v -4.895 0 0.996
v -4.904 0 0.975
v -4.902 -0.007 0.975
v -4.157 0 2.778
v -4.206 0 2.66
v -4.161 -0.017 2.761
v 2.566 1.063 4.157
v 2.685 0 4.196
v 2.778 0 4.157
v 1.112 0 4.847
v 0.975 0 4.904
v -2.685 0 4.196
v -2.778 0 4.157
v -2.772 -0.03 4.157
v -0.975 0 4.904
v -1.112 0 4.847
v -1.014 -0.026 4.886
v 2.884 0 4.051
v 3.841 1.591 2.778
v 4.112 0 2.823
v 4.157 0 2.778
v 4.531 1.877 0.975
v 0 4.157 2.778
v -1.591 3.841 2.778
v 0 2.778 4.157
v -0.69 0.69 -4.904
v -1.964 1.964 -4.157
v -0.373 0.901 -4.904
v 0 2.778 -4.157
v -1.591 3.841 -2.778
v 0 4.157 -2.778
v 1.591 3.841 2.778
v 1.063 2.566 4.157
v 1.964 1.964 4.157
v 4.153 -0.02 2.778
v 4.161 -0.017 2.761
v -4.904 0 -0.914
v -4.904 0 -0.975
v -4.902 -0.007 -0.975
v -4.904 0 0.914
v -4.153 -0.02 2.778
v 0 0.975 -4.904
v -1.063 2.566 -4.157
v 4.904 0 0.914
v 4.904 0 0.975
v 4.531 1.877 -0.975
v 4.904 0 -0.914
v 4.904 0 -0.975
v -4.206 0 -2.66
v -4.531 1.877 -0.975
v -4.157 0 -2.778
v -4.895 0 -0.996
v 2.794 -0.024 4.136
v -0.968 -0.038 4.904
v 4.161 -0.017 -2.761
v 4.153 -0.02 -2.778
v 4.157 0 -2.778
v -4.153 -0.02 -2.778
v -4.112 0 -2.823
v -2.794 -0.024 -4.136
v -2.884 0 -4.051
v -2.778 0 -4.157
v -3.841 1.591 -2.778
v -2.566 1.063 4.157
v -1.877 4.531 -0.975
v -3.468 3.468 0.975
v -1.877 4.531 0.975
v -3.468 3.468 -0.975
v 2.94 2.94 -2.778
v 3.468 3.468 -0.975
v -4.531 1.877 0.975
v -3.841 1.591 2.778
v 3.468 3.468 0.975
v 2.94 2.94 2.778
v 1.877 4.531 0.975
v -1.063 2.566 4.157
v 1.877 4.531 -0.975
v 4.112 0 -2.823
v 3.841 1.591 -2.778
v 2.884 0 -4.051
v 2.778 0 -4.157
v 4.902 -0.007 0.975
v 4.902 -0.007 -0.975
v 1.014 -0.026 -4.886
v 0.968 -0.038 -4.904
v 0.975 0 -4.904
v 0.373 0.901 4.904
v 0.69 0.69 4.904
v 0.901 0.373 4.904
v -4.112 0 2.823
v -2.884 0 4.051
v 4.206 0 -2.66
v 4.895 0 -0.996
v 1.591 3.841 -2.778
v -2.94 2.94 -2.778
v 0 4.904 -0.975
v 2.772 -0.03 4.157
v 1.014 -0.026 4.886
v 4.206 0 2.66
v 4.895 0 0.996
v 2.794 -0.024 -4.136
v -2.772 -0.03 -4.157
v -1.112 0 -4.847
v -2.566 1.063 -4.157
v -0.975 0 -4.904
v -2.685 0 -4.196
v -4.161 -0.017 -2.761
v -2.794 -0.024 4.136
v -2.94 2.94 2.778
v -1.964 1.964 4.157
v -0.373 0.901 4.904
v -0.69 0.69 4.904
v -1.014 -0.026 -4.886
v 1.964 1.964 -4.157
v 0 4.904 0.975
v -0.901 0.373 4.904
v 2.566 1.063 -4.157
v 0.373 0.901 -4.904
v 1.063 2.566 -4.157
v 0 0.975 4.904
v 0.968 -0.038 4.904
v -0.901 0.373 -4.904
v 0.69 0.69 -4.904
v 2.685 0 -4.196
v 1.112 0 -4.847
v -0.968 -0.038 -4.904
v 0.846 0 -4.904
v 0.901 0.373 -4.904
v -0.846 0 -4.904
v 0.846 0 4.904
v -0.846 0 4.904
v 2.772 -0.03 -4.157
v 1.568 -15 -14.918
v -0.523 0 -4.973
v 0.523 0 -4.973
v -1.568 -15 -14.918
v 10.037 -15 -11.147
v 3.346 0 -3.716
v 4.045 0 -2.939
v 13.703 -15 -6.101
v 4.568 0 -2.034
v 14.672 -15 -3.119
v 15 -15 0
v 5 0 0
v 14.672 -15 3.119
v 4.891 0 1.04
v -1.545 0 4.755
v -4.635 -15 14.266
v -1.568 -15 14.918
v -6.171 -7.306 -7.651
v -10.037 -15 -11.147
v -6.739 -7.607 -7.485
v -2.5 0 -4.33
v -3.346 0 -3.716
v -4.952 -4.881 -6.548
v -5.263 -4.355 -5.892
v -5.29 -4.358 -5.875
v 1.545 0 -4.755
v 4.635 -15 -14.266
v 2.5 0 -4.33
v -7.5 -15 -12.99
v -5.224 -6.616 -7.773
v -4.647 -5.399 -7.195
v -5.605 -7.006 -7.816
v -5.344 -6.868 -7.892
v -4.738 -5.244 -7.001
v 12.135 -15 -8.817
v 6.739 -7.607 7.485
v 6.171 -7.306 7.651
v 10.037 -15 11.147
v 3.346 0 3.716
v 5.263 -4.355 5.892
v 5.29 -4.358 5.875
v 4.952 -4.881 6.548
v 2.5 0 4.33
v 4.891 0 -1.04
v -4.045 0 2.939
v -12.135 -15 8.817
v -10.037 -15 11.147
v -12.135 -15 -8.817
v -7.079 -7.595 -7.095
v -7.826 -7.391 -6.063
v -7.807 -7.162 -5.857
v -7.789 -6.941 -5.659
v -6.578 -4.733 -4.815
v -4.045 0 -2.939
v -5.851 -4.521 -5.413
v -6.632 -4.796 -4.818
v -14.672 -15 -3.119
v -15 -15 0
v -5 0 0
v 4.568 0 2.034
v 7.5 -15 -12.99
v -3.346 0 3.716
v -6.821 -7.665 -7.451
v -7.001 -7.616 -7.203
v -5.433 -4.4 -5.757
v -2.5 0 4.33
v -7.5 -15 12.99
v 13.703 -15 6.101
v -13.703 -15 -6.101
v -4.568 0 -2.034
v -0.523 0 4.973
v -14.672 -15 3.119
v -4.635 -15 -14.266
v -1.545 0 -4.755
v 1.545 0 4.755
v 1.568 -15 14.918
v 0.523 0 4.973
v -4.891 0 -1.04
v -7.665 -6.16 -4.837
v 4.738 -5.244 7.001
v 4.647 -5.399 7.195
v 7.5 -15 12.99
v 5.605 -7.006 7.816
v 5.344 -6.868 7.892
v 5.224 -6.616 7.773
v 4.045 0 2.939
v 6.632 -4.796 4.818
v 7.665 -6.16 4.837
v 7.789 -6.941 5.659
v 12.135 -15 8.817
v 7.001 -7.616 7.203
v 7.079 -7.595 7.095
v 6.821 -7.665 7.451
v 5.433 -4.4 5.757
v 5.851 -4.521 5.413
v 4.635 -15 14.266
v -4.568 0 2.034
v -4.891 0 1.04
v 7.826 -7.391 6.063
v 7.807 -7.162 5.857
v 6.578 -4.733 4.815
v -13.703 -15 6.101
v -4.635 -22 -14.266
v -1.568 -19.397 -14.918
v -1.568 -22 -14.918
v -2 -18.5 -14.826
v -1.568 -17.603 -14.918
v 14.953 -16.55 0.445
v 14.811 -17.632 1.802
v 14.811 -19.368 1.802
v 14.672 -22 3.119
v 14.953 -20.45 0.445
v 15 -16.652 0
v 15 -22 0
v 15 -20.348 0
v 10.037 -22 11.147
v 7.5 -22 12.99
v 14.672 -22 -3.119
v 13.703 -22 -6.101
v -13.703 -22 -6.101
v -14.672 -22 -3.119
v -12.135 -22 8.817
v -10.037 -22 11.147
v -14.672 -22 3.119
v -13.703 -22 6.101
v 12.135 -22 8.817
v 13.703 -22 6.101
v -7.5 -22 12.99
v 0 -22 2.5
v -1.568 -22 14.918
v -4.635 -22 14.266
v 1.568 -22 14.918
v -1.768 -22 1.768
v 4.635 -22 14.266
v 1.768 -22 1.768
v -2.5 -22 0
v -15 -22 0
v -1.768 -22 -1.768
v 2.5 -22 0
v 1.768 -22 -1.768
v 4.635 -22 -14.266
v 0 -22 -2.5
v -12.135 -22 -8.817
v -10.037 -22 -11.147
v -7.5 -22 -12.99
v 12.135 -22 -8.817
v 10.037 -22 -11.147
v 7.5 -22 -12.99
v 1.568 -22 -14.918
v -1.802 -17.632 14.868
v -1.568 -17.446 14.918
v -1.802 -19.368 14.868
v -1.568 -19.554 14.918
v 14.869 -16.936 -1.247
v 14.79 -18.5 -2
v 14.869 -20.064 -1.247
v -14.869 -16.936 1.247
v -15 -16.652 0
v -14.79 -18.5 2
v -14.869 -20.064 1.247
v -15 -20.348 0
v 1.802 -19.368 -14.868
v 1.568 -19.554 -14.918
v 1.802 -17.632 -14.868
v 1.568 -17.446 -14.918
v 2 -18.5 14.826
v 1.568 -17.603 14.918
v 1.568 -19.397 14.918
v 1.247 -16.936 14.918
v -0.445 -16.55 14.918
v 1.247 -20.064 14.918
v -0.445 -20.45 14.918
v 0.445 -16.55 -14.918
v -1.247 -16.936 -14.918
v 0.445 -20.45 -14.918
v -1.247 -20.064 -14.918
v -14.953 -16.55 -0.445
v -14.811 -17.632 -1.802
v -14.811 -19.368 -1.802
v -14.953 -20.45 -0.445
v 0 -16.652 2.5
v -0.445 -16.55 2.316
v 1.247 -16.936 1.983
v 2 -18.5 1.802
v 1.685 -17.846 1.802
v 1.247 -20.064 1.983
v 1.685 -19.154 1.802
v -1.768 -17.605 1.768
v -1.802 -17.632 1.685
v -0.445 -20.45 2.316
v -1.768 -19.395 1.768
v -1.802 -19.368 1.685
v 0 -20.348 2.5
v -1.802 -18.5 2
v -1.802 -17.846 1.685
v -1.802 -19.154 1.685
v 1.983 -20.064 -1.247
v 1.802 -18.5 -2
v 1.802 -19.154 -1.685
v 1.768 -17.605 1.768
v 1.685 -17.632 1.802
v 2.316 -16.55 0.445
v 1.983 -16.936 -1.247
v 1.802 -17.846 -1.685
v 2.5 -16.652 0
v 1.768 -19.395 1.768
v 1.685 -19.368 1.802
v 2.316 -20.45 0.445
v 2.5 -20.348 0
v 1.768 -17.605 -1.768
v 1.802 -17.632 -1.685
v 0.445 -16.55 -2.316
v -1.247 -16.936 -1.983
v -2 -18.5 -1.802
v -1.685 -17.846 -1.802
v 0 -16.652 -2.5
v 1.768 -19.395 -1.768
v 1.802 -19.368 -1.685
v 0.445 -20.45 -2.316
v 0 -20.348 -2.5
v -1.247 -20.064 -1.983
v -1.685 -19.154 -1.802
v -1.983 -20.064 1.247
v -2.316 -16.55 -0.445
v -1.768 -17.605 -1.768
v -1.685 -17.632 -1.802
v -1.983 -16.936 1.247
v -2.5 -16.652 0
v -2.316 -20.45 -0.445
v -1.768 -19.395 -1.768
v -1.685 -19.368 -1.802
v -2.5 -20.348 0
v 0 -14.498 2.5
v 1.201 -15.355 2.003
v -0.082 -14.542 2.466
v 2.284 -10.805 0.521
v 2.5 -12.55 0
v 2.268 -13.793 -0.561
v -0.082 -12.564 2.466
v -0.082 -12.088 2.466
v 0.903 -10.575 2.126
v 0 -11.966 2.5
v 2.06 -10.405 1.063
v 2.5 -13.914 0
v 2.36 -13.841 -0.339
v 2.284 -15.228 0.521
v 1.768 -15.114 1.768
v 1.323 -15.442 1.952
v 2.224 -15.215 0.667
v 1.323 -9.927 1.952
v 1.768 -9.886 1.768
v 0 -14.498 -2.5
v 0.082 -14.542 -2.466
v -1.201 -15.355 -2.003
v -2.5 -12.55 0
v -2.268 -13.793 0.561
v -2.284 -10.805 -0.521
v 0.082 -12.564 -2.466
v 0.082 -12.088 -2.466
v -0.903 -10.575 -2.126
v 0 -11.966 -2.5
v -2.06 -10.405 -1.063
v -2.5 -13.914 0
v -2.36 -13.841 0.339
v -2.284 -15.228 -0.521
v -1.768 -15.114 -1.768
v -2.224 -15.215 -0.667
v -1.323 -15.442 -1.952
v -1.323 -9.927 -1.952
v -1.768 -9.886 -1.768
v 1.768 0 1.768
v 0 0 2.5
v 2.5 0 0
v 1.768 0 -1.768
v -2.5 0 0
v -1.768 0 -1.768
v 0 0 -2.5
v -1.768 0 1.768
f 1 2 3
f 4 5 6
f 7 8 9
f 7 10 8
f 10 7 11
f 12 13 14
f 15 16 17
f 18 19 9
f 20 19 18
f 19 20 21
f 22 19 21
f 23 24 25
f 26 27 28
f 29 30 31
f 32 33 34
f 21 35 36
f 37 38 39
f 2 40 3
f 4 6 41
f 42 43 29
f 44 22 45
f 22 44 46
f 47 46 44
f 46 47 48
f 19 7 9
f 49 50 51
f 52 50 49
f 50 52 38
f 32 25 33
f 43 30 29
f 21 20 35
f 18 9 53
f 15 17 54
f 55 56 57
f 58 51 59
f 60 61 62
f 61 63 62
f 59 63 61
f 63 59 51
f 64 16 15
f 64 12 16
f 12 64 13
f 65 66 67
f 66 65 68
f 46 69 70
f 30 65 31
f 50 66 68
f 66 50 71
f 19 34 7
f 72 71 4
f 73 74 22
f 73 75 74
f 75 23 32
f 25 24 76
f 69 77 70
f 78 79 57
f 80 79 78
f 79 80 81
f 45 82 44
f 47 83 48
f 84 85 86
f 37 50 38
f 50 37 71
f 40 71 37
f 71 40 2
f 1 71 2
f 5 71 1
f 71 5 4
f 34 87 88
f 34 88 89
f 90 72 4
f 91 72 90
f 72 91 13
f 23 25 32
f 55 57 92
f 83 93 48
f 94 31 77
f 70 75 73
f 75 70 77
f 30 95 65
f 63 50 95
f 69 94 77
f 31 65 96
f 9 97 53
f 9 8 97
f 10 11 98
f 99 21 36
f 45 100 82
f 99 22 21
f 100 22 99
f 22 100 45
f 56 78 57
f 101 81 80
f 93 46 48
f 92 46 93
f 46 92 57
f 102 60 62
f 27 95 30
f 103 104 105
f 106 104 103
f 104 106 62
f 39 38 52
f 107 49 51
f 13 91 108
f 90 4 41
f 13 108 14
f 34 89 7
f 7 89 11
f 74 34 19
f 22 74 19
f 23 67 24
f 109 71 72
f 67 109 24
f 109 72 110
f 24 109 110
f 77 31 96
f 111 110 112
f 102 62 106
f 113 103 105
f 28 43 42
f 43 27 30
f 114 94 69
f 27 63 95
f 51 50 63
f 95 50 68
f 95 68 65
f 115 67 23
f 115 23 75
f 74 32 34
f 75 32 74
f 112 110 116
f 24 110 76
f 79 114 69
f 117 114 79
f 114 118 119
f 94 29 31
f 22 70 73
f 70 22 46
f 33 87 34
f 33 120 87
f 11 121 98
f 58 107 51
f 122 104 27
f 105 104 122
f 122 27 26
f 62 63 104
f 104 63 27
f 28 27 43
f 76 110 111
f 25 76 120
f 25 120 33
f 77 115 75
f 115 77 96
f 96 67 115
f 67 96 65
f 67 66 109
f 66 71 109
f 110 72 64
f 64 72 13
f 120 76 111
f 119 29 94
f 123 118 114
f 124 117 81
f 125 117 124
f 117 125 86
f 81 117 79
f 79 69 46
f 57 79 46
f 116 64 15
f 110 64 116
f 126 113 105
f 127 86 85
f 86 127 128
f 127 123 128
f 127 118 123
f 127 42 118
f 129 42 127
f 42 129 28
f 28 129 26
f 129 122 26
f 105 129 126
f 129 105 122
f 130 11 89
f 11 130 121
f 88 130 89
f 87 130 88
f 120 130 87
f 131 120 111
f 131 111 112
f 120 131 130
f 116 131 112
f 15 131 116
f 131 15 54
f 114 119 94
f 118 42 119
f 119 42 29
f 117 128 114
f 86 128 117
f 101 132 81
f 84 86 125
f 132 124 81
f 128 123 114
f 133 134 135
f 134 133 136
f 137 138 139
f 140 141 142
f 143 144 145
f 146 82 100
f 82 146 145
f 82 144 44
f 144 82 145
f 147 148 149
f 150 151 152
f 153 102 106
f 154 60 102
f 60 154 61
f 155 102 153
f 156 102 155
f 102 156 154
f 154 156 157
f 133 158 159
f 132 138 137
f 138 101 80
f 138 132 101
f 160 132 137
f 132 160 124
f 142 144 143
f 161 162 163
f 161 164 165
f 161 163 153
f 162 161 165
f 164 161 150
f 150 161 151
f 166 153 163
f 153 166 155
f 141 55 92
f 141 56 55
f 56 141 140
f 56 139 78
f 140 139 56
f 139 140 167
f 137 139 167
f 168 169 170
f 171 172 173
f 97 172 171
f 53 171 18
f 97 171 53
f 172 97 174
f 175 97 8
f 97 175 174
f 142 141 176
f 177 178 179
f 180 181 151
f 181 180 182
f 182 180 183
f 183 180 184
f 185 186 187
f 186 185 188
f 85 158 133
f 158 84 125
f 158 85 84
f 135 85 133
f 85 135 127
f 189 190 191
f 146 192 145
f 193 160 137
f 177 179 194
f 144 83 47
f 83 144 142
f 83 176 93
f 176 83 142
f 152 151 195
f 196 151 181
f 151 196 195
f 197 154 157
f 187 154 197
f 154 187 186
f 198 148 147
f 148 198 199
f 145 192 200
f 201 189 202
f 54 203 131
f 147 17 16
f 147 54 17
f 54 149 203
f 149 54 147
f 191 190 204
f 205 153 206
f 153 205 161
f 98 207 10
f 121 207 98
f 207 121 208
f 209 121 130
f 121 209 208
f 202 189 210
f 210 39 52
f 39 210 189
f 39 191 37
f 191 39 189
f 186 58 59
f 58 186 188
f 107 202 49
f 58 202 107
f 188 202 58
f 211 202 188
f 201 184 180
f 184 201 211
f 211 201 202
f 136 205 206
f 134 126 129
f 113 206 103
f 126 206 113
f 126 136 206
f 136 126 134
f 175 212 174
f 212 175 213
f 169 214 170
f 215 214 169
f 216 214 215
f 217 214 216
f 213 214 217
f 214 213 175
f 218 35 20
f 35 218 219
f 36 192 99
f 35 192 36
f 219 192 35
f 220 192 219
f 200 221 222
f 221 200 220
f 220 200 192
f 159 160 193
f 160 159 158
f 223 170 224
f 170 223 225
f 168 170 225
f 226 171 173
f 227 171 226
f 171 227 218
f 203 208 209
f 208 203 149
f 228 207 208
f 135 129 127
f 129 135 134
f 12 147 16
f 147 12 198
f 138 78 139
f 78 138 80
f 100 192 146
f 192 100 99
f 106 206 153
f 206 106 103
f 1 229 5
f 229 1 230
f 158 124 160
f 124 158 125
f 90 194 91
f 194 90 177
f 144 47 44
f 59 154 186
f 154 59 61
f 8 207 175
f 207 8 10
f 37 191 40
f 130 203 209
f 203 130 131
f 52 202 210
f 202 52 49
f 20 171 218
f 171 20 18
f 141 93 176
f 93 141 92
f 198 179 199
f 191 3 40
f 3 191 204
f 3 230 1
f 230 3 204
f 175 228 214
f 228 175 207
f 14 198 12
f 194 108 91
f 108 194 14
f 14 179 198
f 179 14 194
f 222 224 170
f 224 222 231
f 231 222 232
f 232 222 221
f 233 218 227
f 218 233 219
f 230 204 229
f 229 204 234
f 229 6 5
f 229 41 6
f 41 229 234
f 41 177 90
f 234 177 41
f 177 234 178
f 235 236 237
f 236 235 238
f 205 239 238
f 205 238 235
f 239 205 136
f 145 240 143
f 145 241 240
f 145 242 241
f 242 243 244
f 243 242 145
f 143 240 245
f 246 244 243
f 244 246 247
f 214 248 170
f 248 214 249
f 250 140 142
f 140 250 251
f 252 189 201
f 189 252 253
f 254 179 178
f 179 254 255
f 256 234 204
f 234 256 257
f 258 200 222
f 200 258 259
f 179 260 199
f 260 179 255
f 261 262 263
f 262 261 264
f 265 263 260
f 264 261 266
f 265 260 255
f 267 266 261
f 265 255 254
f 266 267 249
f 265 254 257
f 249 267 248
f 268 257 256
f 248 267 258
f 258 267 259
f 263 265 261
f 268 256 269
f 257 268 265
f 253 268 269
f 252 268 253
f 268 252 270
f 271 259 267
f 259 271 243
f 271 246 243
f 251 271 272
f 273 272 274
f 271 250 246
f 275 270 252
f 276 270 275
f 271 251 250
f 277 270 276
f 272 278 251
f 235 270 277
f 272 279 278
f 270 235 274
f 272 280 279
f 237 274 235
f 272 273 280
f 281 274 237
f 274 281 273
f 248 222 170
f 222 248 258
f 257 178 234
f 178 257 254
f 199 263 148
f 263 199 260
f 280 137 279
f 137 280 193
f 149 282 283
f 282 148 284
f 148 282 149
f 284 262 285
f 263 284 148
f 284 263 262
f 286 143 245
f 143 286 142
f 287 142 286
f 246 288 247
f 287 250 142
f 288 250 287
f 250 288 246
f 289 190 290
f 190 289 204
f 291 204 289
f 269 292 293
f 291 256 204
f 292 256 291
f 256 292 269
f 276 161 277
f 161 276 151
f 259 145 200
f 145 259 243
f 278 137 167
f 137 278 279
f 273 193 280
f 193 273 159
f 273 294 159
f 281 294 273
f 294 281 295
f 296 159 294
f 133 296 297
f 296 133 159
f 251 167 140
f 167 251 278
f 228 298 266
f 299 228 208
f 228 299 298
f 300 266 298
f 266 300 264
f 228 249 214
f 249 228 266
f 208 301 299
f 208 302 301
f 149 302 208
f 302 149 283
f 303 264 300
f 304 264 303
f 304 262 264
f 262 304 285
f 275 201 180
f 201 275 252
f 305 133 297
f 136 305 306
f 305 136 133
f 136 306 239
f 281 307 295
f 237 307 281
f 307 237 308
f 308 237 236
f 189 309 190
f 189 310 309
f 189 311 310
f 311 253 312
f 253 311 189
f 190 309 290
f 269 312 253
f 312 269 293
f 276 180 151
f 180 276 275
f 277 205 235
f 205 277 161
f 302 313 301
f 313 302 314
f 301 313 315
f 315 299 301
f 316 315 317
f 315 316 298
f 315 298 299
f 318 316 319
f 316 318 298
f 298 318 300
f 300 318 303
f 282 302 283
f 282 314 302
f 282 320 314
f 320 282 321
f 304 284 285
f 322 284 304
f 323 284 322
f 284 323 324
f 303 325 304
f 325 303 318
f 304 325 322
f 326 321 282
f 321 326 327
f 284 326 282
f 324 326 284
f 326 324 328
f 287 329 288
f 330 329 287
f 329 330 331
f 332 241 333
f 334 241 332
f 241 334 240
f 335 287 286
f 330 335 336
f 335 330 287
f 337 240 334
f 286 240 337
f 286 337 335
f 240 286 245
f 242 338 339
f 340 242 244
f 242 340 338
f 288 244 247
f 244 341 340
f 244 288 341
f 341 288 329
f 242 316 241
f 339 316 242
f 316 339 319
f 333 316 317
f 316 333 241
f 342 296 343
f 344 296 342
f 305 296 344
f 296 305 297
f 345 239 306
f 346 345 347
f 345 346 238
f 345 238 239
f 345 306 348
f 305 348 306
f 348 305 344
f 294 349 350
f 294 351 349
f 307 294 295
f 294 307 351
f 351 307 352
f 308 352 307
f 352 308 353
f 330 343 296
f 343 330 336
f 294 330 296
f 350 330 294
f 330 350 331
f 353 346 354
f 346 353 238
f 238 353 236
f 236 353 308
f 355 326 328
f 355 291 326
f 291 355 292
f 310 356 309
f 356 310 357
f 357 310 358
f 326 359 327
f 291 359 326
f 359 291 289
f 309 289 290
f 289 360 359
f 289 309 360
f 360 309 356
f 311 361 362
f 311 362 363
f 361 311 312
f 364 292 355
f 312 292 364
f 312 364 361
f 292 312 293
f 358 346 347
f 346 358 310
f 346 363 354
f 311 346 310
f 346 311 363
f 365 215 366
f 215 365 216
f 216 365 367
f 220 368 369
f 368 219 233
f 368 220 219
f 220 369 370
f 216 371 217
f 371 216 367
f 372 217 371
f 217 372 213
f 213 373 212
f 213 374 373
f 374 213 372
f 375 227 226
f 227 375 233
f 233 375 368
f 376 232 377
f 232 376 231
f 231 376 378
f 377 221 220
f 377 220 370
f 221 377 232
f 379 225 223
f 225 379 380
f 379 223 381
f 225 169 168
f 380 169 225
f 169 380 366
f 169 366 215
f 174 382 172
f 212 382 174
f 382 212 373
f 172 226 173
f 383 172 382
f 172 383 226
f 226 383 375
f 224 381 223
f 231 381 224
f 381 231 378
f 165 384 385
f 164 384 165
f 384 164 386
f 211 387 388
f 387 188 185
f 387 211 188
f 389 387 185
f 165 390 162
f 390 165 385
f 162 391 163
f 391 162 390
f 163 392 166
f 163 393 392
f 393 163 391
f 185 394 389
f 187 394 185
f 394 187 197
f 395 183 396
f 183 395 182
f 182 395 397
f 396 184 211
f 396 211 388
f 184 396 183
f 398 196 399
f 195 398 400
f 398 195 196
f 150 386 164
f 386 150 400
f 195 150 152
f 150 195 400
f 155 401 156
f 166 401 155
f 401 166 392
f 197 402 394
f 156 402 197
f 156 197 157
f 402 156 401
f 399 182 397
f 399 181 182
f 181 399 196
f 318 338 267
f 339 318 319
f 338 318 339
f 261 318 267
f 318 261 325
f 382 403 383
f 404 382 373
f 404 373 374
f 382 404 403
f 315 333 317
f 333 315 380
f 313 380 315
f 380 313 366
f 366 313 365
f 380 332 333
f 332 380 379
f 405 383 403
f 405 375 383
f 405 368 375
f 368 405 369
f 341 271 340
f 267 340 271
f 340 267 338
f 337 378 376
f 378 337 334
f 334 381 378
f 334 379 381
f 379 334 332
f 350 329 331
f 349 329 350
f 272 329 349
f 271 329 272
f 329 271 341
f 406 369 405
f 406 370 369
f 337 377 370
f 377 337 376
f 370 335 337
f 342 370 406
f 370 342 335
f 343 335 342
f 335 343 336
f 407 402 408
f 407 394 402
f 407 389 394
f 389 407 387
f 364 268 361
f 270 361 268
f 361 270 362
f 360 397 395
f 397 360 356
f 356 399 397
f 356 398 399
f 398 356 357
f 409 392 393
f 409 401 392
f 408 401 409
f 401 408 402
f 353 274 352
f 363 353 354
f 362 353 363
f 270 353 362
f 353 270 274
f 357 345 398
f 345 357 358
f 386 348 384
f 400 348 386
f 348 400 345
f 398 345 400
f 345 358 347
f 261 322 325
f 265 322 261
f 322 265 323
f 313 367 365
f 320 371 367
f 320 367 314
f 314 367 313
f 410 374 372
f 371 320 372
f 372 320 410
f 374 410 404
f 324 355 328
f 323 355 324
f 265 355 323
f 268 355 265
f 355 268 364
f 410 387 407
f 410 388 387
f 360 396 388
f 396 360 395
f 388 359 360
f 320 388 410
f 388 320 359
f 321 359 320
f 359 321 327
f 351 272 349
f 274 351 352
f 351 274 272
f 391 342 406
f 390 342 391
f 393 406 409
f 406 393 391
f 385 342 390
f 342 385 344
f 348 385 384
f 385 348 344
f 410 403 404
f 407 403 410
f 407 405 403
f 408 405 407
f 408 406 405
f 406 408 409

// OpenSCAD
// file: physical_dimensions.scad
//Physically bound settings.
printing_play = 0.2; //Horizontal error in 3D printing.
printing_overhang = 50; //Maximum overhang angle. 90 is perfect bridging. 0 is no overhang possible.
movement_play = 0.2; //Play to leave if stuff has to move past each other.

m3_bolt_radius = 1.5;
m3_nut_radius = 5.5 / 2;
m3_nut_height = 2.4;
m4_bolt_radius = 2;

ball_radius = 15; //Standard pinball size (7/6 inch).
ball_slit = ball_radius * 2 + movement_play * 2 + 4; //Allow 4mm extra space to make the ball fall through faster.

cabinet_thickness = 18; //1.8cm wooden planks.
cabinet_plank_width = 196; //Planks are this wide.

flipper_solenoid_width = 13;
flipper_solenoid_height = 15;
flipper_solenoid_length = 30;
flipper_solenoid_pin_radius = 2;
flipper_solenoid_pin_retracted = 8.5; //Length when retracted.
flipper_solenoid_pin_expansion = 10; //Stroke length.
flipper_solenoid_pinhole_position = 2.5; //Distance from centre of hole to tip of pin.
flipper_solenoid_pinhole_radius = m3_bolt_radius;
flipper_solenoid_pingap_thickness = 1.6;
flipper_solenoid_pingap_depth = 7;
flipper_solenoid_screw_radius = m3_bolt_radius;
flipper_solenoid_screw1_position = 8; //Distance from front.
flipper_solenoid_screw2_position = 15 + flipper_solenoid_screw1_position;
flipper_solenoid_screw_depth = 4; //Unknown.

hexkey_radius = 2; //Radius of circumscribed circle around hex key.
hexkey_short_length = 30; //Length of short end.//TODO: How long is this?
hexkey_long_length = 100; //TODO: How long is this?
hexkey_turn_radius = 10; //TODO: Also unknown.

lane_width = 50;

matrix_size = [320, 160]; //Size of LED matrix.

playfield_width = 610;
playfield_height = 1220;
playfield_slope = 6; //Degrees.
playfield_thickness = 18;

plunger_cap_radius = 5; //How far the cap protrudes into the launching lane.
plunger_cap_cone_length = 15;
plunger_gate_alignment_length = 10; //At the front of the gate, how long the alignment ramps are that align the ball in the centre.
plunger_rod_length = 100; //TODO: Buy a rod?
plunger_rod_radius = 2.5;
plunger_handle_overlap = 10; //How far the rod protrudes in the handle.
plunger_handle_radius = 20;
plunger_handle_height = 40;
plunger_spring_length = 50; //How much room we need for the spring.

solenoid_width = 13;
solenoid_height = 15;
solenoid_length = 30;
solenoid_pin_radius = 2;
solenoid_pin_retracted = 8.5; //Length when retracted.
solenoid_pin_expansion = 10; //Stroke length.
solenoid_pinhole_position = 2.5; //Distance from centre of hole to tip of pin.
solenoid_pinhole_radius = m3_bolt_radius;
solenoid_pingap_thickness = 1.6;
solenoid_pingap_depth = 7;
solenoid_screw_radius = m3_bolt_radius;
solenoid_screw1_position = 8; //Distance from front.
solenoid_screw2_position = 15 + solenoid_screw1_position;
solenoid_screw_depth = 4; //Unknown.

space_bottom = 100;
space_top = 100;
space_top_back = 200;

spring_end_thickness = 2; //How thick the attachment part of the spring is.
spring_radius = 4; //Radius of the coil of the spring.
// main file
//Cap on top of the plunger rod.
//This has 4 functions:
//* Dampen the force on the ball to not scratch or dent it.
//* Transfer force from the spring towards the rod.
//* Stop the plunger from shooting along the launching lane.
//* Align the plunger towards the centre.

include <physical_dimensions.scad>

module plunger_cap() {
	shaft_length = plunger_rod_length - cabinet_thickness - plunger_handle_overlap - plunger_spring_length - plunger_cap_cone_length;

	difference() {
		union() {
			sphere(r=plunger_cap_radius);
			rotate([90, 0, 0]) {
				cylinder(r1=plunger_cap_radius, r2=ball_radius, h=plunger_cap_cone_length);
			}
			translate([0, -plunger_cap_cone_length, 0]) {
				rotate([90, 0, 0]) {
					cylinder(r=ball_radius, h=shaft_length);
				}
			}
		}
		rotate([90, 0, 0]) {
			cylinder(r=plunger_rod_radius, h=plunger_cap_cone_length + shaft_length);
		}

		//Holes to screw in threaded pins to clamp against the rod.
		translate([0, -plunger_cap_cone_length - shaft_length / 2, 0]) {
			cylinder(r=m4_bolt_radius, h=ball_radius);
			rotate([0, 90, 0]) {
				cylinder(r=m4_bolt_radius, h=ball_radius);
			}
			rotate([0, 180, 0]) {
				cylinder(r=m4_bolt_radius, h=ball_radius);
			}
			rotate([0, 270, 0]) {
				cylinder(r=m4_bolt_radius, h=ball_radius);
			}
		}
		//Diagonal threaded pins.
		translate([0, -plunger_cap_cone_length, 0]) {
			rotate([-45, 45, 0]) {
				cylinder(r=m4_bolt_radius, h=ball_radius);
			}
			rotate([-45, 225, 0]) {
				cylinder(r=m4_bolt_radius, h=ball_radius);
			}
		}
	}
}

plunger_cap();
